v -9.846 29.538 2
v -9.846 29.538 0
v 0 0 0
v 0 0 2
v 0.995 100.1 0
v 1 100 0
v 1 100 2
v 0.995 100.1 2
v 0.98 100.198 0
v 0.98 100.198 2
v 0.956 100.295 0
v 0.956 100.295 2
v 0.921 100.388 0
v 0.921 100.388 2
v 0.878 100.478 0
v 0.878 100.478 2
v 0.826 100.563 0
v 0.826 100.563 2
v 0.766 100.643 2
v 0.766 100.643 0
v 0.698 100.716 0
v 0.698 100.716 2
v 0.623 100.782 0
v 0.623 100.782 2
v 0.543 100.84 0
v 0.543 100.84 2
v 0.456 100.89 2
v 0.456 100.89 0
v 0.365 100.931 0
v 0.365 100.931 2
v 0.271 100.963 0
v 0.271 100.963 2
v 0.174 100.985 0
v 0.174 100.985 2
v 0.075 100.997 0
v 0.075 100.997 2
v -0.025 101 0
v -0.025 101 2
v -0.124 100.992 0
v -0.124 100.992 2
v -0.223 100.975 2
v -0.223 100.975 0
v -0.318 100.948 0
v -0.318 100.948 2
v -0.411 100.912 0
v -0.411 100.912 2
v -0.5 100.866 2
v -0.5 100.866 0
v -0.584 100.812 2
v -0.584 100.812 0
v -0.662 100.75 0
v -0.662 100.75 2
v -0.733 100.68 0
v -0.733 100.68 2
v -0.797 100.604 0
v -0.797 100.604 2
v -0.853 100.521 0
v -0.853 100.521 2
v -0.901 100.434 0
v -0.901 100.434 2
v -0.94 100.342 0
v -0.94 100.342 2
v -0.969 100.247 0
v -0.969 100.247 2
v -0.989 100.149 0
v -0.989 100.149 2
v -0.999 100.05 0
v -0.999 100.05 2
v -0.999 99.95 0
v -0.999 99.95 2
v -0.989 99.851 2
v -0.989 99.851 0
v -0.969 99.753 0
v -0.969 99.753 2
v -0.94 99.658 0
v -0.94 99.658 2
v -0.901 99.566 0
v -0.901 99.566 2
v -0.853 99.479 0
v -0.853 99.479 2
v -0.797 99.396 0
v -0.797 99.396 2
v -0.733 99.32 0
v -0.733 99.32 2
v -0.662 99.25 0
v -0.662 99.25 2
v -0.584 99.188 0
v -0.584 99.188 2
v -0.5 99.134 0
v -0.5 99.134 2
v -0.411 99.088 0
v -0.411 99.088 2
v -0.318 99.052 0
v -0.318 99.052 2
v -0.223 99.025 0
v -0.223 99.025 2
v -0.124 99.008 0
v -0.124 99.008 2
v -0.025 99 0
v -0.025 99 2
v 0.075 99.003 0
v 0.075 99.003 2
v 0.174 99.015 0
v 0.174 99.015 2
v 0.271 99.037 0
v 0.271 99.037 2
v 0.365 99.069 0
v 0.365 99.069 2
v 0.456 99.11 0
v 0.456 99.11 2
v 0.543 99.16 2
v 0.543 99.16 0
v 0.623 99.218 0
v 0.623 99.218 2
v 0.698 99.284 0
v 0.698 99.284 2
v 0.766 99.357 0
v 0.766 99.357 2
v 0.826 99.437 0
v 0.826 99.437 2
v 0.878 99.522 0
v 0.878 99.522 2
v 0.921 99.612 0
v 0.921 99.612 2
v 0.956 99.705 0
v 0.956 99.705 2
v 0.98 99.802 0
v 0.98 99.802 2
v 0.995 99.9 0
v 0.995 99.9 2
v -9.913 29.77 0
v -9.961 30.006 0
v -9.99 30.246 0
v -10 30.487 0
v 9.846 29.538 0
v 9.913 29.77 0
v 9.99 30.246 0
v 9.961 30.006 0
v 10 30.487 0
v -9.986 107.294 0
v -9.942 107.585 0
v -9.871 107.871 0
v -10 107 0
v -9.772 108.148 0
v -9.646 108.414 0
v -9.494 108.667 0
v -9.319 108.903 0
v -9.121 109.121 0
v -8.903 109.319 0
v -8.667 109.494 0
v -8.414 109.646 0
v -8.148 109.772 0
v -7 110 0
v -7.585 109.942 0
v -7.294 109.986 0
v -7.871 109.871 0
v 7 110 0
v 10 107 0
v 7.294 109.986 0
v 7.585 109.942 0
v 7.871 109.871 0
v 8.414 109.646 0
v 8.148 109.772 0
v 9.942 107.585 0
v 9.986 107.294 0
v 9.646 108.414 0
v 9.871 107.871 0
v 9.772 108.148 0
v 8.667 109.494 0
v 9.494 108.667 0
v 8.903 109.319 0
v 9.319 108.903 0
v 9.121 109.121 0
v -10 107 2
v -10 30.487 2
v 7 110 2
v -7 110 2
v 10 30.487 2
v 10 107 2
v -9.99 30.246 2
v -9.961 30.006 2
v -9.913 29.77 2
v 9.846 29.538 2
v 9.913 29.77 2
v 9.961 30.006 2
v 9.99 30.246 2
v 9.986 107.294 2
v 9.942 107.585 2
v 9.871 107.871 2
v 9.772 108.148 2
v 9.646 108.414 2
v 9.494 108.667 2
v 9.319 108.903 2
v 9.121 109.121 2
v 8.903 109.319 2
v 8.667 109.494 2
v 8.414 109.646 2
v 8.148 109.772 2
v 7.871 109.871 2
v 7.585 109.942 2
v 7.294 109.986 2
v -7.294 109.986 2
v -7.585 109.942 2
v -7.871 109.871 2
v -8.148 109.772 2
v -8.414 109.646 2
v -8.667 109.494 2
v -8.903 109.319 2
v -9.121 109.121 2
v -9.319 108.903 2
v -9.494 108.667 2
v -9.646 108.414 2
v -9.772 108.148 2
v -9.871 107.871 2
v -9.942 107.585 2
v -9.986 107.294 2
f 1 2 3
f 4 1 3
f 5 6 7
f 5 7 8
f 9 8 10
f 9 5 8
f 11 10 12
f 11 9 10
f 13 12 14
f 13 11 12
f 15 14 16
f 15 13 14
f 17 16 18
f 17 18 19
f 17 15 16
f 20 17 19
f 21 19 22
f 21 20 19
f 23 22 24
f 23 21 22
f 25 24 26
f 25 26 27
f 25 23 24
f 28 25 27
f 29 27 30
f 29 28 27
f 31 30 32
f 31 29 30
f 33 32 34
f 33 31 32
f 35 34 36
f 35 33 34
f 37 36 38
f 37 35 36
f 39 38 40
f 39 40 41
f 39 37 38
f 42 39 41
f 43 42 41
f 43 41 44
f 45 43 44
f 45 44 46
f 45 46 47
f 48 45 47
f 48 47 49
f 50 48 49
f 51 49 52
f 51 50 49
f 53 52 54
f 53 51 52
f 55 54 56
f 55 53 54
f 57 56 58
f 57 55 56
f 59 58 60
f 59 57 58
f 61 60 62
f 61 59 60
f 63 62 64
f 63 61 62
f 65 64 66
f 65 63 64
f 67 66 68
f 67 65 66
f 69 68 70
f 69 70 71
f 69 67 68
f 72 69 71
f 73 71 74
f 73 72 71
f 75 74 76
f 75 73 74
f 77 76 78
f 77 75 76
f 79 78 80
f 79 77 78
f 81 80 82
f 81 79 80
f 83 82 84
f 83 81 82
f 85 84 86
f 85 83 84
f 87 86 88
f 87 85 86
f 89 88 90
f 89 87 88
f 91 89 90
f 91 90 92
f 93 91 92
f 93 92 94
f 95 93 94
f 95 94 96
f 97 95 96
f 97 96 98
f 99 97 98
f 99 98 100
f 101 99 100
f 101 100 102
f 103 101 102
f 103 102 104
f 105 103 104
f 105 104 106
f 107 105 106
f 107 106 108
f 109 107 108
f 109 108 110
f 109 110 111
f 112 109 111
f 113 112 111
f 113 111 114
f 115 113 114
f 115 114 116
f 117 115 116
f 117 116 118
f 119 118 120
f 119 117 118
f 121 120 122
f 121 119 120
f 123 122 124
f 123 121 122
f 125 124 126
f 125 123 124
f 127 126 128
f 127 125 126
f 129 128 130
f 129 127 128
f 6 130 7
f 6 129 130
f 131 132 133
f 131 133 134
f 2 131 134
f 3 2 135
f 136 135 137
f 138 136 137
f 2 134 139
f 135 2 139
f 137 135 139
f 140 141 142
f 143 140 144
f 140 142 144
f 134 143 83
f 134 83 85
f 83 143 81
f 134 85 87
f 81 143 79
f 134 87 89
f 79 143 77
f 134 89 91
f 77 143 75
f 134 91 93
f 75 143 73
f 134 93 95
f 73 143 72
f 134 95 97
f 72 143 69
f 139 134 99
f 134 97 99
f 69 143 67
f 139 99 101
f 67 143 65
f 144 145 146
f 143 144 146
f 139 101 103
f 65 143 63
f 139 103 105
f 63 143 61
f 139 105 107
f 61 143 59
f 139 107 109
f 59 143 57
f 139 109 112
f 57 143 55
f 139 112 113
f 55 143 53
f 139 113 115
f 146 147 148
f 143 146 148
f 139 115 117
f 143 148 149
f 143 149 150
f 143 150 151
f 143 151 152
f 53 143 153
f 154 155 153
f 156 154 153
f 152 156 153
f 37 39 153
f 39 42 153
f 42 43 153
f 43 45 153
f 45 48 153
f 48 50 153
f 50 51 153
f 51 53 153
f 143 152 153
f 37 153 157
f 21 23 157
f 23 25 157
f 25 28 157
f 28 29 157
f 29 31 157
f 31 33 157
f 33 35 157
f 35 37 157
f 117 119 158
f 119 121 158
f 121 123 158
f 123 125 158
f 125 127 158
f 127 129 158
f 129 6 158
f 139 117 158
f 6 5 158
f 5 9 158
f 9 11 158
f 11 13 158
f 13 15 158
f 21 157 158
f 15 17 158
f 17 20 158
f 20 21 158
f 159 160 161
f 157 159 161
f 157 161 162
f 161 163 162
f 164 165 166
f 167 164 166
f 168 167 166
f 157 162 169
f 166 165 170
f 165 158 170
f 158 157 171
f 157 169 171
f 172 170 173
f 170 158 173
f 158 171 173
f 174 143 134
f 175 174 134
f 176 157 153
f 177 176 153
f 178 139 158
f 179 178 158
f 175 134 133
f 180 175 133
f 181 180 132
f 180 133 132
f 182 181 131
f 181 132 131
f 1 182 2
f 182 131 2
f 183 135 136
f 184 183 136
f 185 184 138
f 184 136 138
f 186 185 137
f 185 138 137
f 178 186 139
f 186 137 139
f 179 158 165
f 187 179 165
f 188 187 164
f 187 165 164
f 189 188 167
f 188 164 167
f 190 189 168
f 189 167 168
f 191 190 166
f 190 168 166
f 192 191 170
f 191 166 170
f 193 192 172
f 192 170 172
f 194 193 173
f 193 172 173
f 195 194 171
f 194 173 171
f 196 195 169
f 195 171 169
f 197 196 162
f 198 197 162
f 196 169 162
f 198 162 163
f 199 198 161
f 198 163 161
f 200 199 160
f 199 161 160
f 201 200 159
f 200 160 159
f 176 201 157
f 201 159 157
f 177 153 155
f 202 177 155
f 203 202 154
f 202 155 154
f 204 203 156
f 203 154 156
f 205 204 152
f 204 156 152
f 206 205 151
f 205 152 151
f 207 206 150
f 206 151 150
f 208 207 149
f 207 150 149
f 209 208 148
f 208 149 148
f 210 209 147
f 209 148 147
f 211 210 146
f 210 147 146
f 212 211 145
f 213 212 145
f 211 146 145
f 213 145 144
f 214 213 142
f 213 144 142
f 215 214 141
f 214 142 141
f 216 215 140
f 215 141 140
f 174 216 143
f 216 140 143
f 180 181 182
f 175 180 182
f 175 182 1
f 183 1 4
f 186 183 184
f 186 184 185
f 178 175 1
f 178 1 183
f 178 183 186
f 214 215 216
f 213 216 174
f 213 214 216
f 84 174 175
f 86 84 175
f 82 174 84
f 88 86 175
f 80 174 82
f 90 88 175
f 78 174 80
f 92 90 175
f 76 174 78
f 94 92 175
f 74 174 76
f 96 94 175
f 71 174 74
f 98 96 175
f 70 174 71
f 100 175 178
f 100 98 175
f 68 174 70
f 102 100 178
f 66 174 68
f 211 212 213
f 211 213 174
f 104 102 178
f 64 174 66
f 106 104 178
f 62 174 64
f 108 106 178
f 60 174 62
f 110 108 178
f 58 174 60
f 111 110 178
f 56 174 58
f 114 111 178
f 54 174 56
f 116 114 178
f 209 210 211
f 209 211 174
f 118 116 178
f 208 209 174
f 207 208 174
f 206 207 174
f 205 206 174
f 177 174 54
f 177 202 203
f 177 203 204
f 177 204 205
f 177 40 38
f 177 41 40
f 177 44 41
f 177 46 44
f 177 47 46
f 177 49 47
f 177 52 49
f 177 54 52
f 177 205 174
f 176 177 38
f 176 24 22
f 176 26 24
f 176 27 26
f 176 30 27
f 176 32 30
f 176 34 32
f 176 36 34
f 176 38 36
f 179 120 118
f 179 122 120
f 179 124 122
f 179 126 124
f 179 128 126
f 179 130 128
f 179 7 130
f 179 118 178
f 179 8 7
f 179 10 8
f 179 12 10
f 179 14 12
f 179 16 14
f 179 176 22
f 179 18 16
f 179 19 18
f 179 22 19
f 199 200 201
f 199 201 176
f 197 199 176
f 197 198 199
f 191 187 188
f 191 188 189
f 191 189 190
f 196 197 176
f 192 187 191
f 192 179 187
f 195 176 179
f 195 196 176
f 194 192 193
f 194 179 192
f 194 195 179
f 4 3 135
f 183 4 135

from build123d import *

# Parameters (mm, degrees)
SKETCH1_R           = 1
BOSS_EXTRUDE1_DEPTH = 2


with BuildPart() as part:
    # Sketch1 → Boss-Extrude1 (new body)
    with BuildSketch(Plane.XY):
        with BuildLine():
            Line((0, 0), (9.846049894, 29.538149682))
            ThreePointArc((9.846049894, 29.538149682), (9.961262373, 30.006286251), (10, 30.486832981))
            Line((10, 30.486832981), (10, 107))
            ThreePointArc((10, 107), (9.121320344, 109.121320344), (7, 110))
            Line((7, 110), (-7, 110))
            ThreePointArc((-7, 110), (-9.121320344, 109.121320344), (-10, 107))
            Line((-10, 107), (-10, 30.486832981))
            ThreePointArc((-10, 30.486832981), (-9.961262373, 30.006286251), (-9.846049894, 29.538149682))
            Line((-9.846049894, 29.538149682), (0, 0))
        make_face()
        with Locations((0, 100)):
            Circle(SKETCH1_R, mode=Mode.SUBTRACT)
    extrude(amount=BOSS_EXTRUDE1_DEPTH)


solid = part.part
